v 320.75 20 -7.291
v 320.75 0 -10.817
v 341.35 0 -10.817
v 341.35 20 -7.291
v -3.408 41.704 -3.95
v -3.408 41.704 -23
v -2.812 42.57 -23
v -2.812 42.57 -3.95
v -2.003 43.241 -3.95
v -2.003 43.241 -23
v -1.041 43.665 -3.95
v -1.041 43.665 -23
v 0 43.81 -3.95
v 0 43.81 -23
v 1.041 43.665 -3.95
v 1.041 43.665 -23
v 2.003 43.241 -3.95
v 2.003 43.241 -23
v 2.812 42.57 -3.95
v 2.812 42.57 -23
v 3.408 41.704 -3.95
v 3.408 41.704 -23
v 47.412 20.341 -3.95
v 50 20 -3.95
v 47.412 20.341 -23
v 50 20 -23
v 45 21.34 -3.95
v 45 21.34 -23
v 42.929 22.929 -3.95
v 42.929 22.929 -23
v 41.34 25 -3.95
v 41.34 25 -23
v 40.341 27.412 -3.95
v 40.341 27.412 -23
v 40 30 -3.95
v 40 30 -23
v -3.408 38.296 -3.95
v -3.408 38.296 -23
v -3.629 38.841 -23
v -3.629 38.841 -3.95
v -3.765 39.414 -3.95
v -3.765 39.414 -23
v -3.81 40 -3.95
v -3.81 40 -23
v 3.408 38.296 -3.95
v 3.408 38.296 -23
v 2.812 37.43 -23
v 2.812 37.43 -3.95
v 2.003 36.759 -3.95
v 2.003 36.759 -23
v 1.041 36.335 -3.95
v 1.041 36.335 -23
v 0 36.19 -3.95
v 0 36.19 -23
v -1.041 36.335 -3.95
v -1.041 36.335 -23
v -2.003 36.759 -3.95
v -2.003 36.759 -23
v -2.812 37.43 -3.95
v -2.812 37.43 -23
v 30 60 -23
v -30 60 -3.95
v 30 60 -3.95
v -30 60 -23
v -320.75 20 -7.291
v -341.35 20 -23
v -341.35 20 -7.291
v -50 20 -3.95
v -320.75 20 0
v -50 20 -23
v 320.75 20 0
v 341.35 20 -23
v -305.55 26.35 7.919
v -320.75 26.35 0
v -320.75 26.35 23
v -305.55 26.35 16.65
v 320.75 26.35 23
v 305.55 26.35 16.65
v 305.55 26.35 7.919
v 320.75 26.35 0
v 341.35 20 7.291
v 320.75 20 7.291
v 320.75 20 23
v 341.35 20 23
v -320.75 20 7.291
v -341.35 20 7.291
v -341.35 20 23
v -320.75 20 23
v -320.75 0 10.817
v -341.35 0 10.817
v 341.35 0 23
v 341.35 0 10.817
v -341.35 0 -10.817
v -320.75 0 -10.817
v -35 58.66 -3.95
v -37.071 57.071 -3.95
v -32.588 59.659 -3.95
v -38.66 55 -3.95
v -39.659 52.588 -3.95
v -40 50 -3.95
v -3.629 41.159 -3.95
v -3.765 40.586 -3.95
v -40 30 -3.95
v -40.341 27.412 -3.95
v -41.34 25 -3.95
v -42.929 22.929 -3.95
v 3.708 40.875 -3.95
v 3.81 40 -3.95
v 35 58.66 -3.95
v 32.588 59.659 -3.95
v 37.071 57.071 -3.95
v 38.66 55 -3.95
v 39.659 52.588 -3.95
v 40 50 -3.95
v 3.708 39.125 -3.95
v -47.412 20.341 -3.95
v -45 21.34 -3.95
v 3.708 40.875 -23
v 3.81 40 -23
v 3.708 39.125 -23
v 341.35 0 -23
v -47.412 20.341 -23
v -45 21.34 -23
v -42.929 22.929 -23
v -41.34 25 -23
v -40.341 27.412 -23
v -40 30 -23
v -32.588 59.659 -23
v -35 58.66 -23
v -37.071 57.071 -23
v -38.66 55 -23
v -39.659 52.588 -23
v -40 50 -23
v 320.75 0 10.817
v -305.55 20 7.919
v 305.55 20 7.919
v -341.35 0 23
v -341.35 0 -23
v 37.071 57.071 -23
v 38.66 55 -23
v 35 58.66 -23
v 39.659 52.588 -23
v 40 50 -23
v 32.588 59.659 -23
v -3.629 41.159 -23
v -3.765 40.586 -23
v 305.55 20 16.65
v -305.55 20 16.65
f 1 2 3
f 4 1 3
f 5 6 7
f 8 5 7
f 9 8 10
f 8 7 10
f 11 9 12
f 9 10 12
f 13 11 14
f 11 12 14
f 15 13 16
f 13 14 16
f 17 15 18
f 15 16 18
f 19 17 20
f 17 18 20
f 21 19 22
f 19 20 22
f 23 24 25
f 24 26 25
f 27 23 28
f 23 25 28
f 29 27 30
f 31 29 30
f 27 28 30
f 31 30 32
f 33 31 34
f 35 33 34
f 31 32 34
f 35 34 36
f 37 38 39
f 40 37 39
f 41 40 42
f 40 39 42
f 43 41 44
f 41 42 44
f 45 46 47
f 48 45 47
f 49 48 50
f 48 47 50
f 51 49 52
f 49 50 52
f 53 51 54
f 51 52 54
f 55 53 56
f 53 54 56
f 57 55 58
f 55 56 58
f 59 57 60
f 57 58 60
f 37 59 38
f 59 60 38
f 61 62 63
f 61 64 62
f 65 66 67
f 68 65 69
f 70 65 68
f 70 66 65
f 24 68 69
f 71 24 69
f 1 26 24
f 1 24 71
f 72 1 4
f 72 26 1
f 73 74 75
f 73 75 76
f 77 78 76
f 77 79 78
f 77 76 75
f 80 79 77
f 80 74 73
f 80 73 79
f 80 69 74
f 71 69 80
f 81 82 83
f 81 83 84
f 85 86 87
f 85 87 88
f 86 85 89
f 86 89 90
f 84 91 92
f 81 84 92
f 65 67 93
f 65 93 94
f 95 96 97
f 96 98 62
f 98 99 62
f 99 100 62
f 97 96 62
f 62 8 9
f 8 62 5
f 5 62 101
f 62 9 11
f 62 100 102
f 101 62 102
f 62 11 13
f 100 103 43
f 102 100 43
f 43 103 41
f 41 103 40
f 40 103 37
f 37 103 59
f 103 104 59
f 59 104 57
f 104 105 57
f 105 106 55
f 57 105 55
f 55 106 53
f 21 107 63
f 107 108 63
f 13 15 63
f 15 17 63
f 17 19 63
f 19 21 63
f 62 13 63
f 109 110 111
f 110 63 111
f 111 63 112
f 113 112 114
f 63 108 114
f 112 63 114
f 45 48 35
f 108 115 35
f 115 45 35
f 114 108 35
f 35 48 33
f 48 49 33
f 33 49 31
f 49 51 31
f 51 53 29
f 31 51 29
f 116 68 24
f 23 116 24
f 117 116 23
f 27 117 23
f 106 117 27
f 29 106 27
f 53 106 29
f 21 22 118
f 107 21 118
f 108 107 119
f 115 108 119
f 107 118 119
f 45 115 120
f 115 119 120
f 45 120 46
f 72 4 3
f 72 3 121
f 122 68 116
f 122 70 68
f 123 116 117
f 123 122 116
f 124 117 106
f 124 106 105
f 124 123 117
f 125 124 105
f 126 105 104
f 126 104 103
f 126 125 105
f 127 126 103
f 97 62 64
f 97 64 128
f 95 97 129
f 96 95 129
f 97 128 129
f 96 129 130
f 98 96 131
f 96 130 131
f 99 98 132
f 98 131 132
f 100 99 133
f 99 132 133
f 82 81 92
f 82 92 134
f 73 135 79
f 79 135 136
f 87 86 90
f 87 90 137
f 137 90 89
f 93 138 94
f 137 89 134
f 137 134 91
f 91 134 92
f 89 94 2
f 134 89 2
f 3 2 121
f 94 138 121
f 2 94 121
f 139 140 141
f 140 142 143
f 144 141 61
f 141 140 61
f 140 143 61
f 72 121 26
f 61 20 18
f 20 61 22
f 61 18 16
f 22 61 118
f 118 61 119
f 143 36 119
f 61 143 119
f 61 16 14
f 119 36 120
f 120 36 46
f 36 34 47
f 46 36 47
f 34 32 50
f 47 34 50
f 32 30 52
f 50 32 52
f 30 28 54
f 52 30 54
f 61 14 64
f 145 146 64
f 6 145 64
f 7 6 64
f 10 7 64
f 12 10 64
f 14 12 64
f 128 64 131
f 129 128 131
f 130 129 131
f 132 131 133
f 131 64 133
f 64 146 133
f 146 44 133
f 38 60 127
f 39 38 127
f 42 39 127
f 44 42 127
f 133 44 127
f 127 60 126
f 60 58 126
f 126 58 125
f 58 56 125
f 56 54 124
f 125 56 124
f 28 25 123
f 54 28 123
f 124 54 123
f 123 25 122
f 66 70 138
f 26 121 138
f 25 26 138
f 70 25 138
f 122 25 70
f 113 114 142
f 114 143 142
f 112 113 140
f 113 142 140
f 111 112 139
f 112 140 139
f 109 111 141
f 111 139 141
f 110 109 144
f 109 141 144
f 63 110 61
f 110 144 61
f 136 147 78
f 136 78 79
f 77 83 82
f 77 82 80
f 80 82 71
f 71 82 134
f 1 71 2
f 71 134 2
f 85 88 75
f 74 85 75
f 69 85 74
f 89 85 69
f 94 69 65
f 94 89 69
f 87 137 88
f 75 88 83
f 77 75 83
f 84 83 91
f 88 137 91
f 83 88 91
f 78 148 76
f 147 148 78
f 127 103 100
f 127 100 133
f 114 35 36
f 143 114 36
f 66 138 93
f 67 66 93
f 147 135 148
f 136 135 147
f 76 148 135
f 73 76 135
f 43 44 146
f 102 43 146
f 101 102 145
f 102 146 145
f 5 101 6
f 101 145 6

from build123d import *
from OCP.BRepFilletAPI import BRepFilletAPI_MakeChamfer

# Parameters (mm, degrees)
BOSS_EXTRUDE1_DEPTH = 20
SKETCH2_W           = 641.5
SKETCH2_H           = 23
SKETCH2_W_2         = 611.1
SKETCH2_H_2         = 8.73125
BOSS_EXTRUDE2_DEPTH = 6.35
SKETCH4_W           = 80
SKETCH4_H           = 19.05
BOSS_EXTRUDE3_DEPTH = 40
CUT_EXTRUDE2_DEPTH  = 50.8
CHAMFER1_SIZE       = 20
CHAMFER1_SIZE_2     = 3.526539614
FILLET1_R           = 10


with BuildPart() as part:
    # Sketch1 → Boss-Extrude1 (new body)
    with BuildSketch(Plane(origin=(0, 0, 0), x_dir=(1, 0, 0), z_dir=(0, 1, 0))):
        Polygon((-341.35, 23), (-341.35, 7.291), (-320.75, 7.291), (-320.75, -7.291), (-341.35, -7.291), (-341.35, -23), (341.35, -23), (341.35, -7.291), (320.75, -7.291), (320.75, 7.291), (341.35, 7.291), (341.35, 23), align=None)
    extrude(amount=BOSS_EXTRUDE1_DEPTH)

    # Sketch2 → Boss-Extrude2 (add)
    with BuildSketch(Plane(origin=(0, 20, 0), x_dir=(1, 0, 0), z_dir=(0, 1, 0))):
        with Locations((0, -11.5)):
            Rectangle(SKETCH2_W, SKETCH2_H)
        with Locations((0, -12.284375)):
            Rectangle(SKETCH2_W_2, SKETCH2_H_2, mode=Mode.SUBTRACT)
    extrude(amount=BOSS_EXTRUDE2_DEPTH)

    # Sketch4 → Boss-Extrude3 (add)
    with BuildSketch(Plane(origin=(0, 20, 0), x_dir=(1, 0, 0), z_dir=(0, 1, 0))):
        with Locations((0, 13.475)):
            Rectangle(SKETCH4_W, SKETCH4_H)
    extrude(amount=BOSS_EXTRUDE3_DEPTH)

    # Sketch5 → Cut-Extrude2 (cut)
    with BuildSketch(Plane(origin=(0, 0, -23), x_dir=(-1, 0, 0), z_dir=(0, 0, -1))):
        with BuildLine():
            ThreePointArc((3.407767598, 41.703883799), (0, 43.81), (-3.407767598, 41.703883799))
            Line((-3.407767598, 41.703883799), (0, 40))
            Line((0, 40), (3.407767598, 41.703883799))
        make_face()
        with BuildLine():
            Line((0, 40), (-3.407767598, 41.703883799))
            ThreePointArc((-3.407767598, 41.703883799), (-3.81, 40), (-3.407767598, 38.296116201))
            Line((-3.407767598, 38.296116201), (0, 40))
        make_face()
        with BuildLine():
            Line((3.407767598, 41.703883799), (0, 40))
            Line((0, 40), (3.407767598, 38.296116201))
            ThreePointArc((3.407767598, 38.296116201), (3.70807865, 39.124641373), (3.81, 40))
            ThreePointArc((3.81, 40), (3.70807865, 40.875358627), (3.407767598, 41.703883799))
        make_face()
        with BuildLine():
            Line((3.407767598, 38.296116201), (0, 40))
            Line((0, 40), (-3.407767598, 38.296116201))
            ThreePointArc((-3.407767598, 38.296116201), (0, 36.19), (3.407767598, 38.296116201))
        make_face()
    extrude(amount=-CUT_EXTRUDE2_DEPTH, mode=Mode.SUBTRACT)

    # Chamfer1
    chamfer1_edges_1 = [part.edges().sort_by_distance(p)[0] for p in [
        (331.05, 0, -7.291),
    ]]
    chamfer1_side_1 = [part.faces().sort_by_distance(p)[0] for p in [
        (331.05, 0.070530792, -7.291),
    ]]
    chamfer1_edges_2 = [part.edges().sort_by_distance(p)[0] for p in [
        (331.05, 0, 7.291),
    ]]
    chamfer1_side_2 = [part.faces().sort_by_distance(p)[0] for p in [
        (331.05, 0, 7.361530792),
    ]]
    chamfer1_edges_3 = [part.edges().sort_by_distance(p)[0] for p in [
        (-331.05, 0, 7.291),
    ]]
    chamfer1_side_3 = [part.faces().sort_by_distance(p)[0] for p in [
        (-331.05, 0, 7.361530792),
    ]]
    chamfer1_edges_4 = [part.edges().sort_by_distance(p)[0] for p in [
        (-331.05, 0, -7.291),
    ]]
    chamfer1_side_4 = [part.faces().sort_by_distance(p)[0] for p in [
        (-331.05, 0, -7.361530792),
    ]]
    chamfer1 = BRepFilletAPI_MakeChamfer(part.part.solid().wrapped)
    for e in chamfer1_edges_1:
        chamfer1.Add(CHAMFER1_SIZE - 0.0001, CHAMFER1_SIZE_2 - 0.0001, e.wrapped, chamfer1_side_1[0].wrapped)
    for e in chamfer1_edges_2:
        chamfer1.Add(CHAMFER1_SIZE_2 - 0.0001, CHAMFER1_SIZE - 0.0001, e.wrapped, chamfer1_side_2[0].wrapped)
    for e in chamfer1_edges_3:
        chamfer1.Add(CHAMFER1_SIZE_2 - 0.0001, CHAMFER1_SIZE - 0.0001, e.wrapped, chamfer1_side_3[0].wrapped)
    for e in chamfer1_edges_4:
        chamfer1.Add(CHAMFER1_SIZE_2 - 0.0001, CHAMFER1_SIZE - 0.0001, e.wrapped, chamfer1_side_4[0].wrapped)
    add(Compound.cast(chamfer1.Shape()), mode=Mode.REPLACE)  # a hair under: the kernel refuses the full size

    # Fillet1
    fillet1_edges = [part.edges().sort_by_distance(p)[0] for p in [
        (40, 20, -13.475),
        (-40, 60, -13.475),
        (40, 60, -13.475),
        (-40, 20, -13.475),
    ]]
    fillet(fillet1_edges, radius=FILLET1_R)


solid = part.part
